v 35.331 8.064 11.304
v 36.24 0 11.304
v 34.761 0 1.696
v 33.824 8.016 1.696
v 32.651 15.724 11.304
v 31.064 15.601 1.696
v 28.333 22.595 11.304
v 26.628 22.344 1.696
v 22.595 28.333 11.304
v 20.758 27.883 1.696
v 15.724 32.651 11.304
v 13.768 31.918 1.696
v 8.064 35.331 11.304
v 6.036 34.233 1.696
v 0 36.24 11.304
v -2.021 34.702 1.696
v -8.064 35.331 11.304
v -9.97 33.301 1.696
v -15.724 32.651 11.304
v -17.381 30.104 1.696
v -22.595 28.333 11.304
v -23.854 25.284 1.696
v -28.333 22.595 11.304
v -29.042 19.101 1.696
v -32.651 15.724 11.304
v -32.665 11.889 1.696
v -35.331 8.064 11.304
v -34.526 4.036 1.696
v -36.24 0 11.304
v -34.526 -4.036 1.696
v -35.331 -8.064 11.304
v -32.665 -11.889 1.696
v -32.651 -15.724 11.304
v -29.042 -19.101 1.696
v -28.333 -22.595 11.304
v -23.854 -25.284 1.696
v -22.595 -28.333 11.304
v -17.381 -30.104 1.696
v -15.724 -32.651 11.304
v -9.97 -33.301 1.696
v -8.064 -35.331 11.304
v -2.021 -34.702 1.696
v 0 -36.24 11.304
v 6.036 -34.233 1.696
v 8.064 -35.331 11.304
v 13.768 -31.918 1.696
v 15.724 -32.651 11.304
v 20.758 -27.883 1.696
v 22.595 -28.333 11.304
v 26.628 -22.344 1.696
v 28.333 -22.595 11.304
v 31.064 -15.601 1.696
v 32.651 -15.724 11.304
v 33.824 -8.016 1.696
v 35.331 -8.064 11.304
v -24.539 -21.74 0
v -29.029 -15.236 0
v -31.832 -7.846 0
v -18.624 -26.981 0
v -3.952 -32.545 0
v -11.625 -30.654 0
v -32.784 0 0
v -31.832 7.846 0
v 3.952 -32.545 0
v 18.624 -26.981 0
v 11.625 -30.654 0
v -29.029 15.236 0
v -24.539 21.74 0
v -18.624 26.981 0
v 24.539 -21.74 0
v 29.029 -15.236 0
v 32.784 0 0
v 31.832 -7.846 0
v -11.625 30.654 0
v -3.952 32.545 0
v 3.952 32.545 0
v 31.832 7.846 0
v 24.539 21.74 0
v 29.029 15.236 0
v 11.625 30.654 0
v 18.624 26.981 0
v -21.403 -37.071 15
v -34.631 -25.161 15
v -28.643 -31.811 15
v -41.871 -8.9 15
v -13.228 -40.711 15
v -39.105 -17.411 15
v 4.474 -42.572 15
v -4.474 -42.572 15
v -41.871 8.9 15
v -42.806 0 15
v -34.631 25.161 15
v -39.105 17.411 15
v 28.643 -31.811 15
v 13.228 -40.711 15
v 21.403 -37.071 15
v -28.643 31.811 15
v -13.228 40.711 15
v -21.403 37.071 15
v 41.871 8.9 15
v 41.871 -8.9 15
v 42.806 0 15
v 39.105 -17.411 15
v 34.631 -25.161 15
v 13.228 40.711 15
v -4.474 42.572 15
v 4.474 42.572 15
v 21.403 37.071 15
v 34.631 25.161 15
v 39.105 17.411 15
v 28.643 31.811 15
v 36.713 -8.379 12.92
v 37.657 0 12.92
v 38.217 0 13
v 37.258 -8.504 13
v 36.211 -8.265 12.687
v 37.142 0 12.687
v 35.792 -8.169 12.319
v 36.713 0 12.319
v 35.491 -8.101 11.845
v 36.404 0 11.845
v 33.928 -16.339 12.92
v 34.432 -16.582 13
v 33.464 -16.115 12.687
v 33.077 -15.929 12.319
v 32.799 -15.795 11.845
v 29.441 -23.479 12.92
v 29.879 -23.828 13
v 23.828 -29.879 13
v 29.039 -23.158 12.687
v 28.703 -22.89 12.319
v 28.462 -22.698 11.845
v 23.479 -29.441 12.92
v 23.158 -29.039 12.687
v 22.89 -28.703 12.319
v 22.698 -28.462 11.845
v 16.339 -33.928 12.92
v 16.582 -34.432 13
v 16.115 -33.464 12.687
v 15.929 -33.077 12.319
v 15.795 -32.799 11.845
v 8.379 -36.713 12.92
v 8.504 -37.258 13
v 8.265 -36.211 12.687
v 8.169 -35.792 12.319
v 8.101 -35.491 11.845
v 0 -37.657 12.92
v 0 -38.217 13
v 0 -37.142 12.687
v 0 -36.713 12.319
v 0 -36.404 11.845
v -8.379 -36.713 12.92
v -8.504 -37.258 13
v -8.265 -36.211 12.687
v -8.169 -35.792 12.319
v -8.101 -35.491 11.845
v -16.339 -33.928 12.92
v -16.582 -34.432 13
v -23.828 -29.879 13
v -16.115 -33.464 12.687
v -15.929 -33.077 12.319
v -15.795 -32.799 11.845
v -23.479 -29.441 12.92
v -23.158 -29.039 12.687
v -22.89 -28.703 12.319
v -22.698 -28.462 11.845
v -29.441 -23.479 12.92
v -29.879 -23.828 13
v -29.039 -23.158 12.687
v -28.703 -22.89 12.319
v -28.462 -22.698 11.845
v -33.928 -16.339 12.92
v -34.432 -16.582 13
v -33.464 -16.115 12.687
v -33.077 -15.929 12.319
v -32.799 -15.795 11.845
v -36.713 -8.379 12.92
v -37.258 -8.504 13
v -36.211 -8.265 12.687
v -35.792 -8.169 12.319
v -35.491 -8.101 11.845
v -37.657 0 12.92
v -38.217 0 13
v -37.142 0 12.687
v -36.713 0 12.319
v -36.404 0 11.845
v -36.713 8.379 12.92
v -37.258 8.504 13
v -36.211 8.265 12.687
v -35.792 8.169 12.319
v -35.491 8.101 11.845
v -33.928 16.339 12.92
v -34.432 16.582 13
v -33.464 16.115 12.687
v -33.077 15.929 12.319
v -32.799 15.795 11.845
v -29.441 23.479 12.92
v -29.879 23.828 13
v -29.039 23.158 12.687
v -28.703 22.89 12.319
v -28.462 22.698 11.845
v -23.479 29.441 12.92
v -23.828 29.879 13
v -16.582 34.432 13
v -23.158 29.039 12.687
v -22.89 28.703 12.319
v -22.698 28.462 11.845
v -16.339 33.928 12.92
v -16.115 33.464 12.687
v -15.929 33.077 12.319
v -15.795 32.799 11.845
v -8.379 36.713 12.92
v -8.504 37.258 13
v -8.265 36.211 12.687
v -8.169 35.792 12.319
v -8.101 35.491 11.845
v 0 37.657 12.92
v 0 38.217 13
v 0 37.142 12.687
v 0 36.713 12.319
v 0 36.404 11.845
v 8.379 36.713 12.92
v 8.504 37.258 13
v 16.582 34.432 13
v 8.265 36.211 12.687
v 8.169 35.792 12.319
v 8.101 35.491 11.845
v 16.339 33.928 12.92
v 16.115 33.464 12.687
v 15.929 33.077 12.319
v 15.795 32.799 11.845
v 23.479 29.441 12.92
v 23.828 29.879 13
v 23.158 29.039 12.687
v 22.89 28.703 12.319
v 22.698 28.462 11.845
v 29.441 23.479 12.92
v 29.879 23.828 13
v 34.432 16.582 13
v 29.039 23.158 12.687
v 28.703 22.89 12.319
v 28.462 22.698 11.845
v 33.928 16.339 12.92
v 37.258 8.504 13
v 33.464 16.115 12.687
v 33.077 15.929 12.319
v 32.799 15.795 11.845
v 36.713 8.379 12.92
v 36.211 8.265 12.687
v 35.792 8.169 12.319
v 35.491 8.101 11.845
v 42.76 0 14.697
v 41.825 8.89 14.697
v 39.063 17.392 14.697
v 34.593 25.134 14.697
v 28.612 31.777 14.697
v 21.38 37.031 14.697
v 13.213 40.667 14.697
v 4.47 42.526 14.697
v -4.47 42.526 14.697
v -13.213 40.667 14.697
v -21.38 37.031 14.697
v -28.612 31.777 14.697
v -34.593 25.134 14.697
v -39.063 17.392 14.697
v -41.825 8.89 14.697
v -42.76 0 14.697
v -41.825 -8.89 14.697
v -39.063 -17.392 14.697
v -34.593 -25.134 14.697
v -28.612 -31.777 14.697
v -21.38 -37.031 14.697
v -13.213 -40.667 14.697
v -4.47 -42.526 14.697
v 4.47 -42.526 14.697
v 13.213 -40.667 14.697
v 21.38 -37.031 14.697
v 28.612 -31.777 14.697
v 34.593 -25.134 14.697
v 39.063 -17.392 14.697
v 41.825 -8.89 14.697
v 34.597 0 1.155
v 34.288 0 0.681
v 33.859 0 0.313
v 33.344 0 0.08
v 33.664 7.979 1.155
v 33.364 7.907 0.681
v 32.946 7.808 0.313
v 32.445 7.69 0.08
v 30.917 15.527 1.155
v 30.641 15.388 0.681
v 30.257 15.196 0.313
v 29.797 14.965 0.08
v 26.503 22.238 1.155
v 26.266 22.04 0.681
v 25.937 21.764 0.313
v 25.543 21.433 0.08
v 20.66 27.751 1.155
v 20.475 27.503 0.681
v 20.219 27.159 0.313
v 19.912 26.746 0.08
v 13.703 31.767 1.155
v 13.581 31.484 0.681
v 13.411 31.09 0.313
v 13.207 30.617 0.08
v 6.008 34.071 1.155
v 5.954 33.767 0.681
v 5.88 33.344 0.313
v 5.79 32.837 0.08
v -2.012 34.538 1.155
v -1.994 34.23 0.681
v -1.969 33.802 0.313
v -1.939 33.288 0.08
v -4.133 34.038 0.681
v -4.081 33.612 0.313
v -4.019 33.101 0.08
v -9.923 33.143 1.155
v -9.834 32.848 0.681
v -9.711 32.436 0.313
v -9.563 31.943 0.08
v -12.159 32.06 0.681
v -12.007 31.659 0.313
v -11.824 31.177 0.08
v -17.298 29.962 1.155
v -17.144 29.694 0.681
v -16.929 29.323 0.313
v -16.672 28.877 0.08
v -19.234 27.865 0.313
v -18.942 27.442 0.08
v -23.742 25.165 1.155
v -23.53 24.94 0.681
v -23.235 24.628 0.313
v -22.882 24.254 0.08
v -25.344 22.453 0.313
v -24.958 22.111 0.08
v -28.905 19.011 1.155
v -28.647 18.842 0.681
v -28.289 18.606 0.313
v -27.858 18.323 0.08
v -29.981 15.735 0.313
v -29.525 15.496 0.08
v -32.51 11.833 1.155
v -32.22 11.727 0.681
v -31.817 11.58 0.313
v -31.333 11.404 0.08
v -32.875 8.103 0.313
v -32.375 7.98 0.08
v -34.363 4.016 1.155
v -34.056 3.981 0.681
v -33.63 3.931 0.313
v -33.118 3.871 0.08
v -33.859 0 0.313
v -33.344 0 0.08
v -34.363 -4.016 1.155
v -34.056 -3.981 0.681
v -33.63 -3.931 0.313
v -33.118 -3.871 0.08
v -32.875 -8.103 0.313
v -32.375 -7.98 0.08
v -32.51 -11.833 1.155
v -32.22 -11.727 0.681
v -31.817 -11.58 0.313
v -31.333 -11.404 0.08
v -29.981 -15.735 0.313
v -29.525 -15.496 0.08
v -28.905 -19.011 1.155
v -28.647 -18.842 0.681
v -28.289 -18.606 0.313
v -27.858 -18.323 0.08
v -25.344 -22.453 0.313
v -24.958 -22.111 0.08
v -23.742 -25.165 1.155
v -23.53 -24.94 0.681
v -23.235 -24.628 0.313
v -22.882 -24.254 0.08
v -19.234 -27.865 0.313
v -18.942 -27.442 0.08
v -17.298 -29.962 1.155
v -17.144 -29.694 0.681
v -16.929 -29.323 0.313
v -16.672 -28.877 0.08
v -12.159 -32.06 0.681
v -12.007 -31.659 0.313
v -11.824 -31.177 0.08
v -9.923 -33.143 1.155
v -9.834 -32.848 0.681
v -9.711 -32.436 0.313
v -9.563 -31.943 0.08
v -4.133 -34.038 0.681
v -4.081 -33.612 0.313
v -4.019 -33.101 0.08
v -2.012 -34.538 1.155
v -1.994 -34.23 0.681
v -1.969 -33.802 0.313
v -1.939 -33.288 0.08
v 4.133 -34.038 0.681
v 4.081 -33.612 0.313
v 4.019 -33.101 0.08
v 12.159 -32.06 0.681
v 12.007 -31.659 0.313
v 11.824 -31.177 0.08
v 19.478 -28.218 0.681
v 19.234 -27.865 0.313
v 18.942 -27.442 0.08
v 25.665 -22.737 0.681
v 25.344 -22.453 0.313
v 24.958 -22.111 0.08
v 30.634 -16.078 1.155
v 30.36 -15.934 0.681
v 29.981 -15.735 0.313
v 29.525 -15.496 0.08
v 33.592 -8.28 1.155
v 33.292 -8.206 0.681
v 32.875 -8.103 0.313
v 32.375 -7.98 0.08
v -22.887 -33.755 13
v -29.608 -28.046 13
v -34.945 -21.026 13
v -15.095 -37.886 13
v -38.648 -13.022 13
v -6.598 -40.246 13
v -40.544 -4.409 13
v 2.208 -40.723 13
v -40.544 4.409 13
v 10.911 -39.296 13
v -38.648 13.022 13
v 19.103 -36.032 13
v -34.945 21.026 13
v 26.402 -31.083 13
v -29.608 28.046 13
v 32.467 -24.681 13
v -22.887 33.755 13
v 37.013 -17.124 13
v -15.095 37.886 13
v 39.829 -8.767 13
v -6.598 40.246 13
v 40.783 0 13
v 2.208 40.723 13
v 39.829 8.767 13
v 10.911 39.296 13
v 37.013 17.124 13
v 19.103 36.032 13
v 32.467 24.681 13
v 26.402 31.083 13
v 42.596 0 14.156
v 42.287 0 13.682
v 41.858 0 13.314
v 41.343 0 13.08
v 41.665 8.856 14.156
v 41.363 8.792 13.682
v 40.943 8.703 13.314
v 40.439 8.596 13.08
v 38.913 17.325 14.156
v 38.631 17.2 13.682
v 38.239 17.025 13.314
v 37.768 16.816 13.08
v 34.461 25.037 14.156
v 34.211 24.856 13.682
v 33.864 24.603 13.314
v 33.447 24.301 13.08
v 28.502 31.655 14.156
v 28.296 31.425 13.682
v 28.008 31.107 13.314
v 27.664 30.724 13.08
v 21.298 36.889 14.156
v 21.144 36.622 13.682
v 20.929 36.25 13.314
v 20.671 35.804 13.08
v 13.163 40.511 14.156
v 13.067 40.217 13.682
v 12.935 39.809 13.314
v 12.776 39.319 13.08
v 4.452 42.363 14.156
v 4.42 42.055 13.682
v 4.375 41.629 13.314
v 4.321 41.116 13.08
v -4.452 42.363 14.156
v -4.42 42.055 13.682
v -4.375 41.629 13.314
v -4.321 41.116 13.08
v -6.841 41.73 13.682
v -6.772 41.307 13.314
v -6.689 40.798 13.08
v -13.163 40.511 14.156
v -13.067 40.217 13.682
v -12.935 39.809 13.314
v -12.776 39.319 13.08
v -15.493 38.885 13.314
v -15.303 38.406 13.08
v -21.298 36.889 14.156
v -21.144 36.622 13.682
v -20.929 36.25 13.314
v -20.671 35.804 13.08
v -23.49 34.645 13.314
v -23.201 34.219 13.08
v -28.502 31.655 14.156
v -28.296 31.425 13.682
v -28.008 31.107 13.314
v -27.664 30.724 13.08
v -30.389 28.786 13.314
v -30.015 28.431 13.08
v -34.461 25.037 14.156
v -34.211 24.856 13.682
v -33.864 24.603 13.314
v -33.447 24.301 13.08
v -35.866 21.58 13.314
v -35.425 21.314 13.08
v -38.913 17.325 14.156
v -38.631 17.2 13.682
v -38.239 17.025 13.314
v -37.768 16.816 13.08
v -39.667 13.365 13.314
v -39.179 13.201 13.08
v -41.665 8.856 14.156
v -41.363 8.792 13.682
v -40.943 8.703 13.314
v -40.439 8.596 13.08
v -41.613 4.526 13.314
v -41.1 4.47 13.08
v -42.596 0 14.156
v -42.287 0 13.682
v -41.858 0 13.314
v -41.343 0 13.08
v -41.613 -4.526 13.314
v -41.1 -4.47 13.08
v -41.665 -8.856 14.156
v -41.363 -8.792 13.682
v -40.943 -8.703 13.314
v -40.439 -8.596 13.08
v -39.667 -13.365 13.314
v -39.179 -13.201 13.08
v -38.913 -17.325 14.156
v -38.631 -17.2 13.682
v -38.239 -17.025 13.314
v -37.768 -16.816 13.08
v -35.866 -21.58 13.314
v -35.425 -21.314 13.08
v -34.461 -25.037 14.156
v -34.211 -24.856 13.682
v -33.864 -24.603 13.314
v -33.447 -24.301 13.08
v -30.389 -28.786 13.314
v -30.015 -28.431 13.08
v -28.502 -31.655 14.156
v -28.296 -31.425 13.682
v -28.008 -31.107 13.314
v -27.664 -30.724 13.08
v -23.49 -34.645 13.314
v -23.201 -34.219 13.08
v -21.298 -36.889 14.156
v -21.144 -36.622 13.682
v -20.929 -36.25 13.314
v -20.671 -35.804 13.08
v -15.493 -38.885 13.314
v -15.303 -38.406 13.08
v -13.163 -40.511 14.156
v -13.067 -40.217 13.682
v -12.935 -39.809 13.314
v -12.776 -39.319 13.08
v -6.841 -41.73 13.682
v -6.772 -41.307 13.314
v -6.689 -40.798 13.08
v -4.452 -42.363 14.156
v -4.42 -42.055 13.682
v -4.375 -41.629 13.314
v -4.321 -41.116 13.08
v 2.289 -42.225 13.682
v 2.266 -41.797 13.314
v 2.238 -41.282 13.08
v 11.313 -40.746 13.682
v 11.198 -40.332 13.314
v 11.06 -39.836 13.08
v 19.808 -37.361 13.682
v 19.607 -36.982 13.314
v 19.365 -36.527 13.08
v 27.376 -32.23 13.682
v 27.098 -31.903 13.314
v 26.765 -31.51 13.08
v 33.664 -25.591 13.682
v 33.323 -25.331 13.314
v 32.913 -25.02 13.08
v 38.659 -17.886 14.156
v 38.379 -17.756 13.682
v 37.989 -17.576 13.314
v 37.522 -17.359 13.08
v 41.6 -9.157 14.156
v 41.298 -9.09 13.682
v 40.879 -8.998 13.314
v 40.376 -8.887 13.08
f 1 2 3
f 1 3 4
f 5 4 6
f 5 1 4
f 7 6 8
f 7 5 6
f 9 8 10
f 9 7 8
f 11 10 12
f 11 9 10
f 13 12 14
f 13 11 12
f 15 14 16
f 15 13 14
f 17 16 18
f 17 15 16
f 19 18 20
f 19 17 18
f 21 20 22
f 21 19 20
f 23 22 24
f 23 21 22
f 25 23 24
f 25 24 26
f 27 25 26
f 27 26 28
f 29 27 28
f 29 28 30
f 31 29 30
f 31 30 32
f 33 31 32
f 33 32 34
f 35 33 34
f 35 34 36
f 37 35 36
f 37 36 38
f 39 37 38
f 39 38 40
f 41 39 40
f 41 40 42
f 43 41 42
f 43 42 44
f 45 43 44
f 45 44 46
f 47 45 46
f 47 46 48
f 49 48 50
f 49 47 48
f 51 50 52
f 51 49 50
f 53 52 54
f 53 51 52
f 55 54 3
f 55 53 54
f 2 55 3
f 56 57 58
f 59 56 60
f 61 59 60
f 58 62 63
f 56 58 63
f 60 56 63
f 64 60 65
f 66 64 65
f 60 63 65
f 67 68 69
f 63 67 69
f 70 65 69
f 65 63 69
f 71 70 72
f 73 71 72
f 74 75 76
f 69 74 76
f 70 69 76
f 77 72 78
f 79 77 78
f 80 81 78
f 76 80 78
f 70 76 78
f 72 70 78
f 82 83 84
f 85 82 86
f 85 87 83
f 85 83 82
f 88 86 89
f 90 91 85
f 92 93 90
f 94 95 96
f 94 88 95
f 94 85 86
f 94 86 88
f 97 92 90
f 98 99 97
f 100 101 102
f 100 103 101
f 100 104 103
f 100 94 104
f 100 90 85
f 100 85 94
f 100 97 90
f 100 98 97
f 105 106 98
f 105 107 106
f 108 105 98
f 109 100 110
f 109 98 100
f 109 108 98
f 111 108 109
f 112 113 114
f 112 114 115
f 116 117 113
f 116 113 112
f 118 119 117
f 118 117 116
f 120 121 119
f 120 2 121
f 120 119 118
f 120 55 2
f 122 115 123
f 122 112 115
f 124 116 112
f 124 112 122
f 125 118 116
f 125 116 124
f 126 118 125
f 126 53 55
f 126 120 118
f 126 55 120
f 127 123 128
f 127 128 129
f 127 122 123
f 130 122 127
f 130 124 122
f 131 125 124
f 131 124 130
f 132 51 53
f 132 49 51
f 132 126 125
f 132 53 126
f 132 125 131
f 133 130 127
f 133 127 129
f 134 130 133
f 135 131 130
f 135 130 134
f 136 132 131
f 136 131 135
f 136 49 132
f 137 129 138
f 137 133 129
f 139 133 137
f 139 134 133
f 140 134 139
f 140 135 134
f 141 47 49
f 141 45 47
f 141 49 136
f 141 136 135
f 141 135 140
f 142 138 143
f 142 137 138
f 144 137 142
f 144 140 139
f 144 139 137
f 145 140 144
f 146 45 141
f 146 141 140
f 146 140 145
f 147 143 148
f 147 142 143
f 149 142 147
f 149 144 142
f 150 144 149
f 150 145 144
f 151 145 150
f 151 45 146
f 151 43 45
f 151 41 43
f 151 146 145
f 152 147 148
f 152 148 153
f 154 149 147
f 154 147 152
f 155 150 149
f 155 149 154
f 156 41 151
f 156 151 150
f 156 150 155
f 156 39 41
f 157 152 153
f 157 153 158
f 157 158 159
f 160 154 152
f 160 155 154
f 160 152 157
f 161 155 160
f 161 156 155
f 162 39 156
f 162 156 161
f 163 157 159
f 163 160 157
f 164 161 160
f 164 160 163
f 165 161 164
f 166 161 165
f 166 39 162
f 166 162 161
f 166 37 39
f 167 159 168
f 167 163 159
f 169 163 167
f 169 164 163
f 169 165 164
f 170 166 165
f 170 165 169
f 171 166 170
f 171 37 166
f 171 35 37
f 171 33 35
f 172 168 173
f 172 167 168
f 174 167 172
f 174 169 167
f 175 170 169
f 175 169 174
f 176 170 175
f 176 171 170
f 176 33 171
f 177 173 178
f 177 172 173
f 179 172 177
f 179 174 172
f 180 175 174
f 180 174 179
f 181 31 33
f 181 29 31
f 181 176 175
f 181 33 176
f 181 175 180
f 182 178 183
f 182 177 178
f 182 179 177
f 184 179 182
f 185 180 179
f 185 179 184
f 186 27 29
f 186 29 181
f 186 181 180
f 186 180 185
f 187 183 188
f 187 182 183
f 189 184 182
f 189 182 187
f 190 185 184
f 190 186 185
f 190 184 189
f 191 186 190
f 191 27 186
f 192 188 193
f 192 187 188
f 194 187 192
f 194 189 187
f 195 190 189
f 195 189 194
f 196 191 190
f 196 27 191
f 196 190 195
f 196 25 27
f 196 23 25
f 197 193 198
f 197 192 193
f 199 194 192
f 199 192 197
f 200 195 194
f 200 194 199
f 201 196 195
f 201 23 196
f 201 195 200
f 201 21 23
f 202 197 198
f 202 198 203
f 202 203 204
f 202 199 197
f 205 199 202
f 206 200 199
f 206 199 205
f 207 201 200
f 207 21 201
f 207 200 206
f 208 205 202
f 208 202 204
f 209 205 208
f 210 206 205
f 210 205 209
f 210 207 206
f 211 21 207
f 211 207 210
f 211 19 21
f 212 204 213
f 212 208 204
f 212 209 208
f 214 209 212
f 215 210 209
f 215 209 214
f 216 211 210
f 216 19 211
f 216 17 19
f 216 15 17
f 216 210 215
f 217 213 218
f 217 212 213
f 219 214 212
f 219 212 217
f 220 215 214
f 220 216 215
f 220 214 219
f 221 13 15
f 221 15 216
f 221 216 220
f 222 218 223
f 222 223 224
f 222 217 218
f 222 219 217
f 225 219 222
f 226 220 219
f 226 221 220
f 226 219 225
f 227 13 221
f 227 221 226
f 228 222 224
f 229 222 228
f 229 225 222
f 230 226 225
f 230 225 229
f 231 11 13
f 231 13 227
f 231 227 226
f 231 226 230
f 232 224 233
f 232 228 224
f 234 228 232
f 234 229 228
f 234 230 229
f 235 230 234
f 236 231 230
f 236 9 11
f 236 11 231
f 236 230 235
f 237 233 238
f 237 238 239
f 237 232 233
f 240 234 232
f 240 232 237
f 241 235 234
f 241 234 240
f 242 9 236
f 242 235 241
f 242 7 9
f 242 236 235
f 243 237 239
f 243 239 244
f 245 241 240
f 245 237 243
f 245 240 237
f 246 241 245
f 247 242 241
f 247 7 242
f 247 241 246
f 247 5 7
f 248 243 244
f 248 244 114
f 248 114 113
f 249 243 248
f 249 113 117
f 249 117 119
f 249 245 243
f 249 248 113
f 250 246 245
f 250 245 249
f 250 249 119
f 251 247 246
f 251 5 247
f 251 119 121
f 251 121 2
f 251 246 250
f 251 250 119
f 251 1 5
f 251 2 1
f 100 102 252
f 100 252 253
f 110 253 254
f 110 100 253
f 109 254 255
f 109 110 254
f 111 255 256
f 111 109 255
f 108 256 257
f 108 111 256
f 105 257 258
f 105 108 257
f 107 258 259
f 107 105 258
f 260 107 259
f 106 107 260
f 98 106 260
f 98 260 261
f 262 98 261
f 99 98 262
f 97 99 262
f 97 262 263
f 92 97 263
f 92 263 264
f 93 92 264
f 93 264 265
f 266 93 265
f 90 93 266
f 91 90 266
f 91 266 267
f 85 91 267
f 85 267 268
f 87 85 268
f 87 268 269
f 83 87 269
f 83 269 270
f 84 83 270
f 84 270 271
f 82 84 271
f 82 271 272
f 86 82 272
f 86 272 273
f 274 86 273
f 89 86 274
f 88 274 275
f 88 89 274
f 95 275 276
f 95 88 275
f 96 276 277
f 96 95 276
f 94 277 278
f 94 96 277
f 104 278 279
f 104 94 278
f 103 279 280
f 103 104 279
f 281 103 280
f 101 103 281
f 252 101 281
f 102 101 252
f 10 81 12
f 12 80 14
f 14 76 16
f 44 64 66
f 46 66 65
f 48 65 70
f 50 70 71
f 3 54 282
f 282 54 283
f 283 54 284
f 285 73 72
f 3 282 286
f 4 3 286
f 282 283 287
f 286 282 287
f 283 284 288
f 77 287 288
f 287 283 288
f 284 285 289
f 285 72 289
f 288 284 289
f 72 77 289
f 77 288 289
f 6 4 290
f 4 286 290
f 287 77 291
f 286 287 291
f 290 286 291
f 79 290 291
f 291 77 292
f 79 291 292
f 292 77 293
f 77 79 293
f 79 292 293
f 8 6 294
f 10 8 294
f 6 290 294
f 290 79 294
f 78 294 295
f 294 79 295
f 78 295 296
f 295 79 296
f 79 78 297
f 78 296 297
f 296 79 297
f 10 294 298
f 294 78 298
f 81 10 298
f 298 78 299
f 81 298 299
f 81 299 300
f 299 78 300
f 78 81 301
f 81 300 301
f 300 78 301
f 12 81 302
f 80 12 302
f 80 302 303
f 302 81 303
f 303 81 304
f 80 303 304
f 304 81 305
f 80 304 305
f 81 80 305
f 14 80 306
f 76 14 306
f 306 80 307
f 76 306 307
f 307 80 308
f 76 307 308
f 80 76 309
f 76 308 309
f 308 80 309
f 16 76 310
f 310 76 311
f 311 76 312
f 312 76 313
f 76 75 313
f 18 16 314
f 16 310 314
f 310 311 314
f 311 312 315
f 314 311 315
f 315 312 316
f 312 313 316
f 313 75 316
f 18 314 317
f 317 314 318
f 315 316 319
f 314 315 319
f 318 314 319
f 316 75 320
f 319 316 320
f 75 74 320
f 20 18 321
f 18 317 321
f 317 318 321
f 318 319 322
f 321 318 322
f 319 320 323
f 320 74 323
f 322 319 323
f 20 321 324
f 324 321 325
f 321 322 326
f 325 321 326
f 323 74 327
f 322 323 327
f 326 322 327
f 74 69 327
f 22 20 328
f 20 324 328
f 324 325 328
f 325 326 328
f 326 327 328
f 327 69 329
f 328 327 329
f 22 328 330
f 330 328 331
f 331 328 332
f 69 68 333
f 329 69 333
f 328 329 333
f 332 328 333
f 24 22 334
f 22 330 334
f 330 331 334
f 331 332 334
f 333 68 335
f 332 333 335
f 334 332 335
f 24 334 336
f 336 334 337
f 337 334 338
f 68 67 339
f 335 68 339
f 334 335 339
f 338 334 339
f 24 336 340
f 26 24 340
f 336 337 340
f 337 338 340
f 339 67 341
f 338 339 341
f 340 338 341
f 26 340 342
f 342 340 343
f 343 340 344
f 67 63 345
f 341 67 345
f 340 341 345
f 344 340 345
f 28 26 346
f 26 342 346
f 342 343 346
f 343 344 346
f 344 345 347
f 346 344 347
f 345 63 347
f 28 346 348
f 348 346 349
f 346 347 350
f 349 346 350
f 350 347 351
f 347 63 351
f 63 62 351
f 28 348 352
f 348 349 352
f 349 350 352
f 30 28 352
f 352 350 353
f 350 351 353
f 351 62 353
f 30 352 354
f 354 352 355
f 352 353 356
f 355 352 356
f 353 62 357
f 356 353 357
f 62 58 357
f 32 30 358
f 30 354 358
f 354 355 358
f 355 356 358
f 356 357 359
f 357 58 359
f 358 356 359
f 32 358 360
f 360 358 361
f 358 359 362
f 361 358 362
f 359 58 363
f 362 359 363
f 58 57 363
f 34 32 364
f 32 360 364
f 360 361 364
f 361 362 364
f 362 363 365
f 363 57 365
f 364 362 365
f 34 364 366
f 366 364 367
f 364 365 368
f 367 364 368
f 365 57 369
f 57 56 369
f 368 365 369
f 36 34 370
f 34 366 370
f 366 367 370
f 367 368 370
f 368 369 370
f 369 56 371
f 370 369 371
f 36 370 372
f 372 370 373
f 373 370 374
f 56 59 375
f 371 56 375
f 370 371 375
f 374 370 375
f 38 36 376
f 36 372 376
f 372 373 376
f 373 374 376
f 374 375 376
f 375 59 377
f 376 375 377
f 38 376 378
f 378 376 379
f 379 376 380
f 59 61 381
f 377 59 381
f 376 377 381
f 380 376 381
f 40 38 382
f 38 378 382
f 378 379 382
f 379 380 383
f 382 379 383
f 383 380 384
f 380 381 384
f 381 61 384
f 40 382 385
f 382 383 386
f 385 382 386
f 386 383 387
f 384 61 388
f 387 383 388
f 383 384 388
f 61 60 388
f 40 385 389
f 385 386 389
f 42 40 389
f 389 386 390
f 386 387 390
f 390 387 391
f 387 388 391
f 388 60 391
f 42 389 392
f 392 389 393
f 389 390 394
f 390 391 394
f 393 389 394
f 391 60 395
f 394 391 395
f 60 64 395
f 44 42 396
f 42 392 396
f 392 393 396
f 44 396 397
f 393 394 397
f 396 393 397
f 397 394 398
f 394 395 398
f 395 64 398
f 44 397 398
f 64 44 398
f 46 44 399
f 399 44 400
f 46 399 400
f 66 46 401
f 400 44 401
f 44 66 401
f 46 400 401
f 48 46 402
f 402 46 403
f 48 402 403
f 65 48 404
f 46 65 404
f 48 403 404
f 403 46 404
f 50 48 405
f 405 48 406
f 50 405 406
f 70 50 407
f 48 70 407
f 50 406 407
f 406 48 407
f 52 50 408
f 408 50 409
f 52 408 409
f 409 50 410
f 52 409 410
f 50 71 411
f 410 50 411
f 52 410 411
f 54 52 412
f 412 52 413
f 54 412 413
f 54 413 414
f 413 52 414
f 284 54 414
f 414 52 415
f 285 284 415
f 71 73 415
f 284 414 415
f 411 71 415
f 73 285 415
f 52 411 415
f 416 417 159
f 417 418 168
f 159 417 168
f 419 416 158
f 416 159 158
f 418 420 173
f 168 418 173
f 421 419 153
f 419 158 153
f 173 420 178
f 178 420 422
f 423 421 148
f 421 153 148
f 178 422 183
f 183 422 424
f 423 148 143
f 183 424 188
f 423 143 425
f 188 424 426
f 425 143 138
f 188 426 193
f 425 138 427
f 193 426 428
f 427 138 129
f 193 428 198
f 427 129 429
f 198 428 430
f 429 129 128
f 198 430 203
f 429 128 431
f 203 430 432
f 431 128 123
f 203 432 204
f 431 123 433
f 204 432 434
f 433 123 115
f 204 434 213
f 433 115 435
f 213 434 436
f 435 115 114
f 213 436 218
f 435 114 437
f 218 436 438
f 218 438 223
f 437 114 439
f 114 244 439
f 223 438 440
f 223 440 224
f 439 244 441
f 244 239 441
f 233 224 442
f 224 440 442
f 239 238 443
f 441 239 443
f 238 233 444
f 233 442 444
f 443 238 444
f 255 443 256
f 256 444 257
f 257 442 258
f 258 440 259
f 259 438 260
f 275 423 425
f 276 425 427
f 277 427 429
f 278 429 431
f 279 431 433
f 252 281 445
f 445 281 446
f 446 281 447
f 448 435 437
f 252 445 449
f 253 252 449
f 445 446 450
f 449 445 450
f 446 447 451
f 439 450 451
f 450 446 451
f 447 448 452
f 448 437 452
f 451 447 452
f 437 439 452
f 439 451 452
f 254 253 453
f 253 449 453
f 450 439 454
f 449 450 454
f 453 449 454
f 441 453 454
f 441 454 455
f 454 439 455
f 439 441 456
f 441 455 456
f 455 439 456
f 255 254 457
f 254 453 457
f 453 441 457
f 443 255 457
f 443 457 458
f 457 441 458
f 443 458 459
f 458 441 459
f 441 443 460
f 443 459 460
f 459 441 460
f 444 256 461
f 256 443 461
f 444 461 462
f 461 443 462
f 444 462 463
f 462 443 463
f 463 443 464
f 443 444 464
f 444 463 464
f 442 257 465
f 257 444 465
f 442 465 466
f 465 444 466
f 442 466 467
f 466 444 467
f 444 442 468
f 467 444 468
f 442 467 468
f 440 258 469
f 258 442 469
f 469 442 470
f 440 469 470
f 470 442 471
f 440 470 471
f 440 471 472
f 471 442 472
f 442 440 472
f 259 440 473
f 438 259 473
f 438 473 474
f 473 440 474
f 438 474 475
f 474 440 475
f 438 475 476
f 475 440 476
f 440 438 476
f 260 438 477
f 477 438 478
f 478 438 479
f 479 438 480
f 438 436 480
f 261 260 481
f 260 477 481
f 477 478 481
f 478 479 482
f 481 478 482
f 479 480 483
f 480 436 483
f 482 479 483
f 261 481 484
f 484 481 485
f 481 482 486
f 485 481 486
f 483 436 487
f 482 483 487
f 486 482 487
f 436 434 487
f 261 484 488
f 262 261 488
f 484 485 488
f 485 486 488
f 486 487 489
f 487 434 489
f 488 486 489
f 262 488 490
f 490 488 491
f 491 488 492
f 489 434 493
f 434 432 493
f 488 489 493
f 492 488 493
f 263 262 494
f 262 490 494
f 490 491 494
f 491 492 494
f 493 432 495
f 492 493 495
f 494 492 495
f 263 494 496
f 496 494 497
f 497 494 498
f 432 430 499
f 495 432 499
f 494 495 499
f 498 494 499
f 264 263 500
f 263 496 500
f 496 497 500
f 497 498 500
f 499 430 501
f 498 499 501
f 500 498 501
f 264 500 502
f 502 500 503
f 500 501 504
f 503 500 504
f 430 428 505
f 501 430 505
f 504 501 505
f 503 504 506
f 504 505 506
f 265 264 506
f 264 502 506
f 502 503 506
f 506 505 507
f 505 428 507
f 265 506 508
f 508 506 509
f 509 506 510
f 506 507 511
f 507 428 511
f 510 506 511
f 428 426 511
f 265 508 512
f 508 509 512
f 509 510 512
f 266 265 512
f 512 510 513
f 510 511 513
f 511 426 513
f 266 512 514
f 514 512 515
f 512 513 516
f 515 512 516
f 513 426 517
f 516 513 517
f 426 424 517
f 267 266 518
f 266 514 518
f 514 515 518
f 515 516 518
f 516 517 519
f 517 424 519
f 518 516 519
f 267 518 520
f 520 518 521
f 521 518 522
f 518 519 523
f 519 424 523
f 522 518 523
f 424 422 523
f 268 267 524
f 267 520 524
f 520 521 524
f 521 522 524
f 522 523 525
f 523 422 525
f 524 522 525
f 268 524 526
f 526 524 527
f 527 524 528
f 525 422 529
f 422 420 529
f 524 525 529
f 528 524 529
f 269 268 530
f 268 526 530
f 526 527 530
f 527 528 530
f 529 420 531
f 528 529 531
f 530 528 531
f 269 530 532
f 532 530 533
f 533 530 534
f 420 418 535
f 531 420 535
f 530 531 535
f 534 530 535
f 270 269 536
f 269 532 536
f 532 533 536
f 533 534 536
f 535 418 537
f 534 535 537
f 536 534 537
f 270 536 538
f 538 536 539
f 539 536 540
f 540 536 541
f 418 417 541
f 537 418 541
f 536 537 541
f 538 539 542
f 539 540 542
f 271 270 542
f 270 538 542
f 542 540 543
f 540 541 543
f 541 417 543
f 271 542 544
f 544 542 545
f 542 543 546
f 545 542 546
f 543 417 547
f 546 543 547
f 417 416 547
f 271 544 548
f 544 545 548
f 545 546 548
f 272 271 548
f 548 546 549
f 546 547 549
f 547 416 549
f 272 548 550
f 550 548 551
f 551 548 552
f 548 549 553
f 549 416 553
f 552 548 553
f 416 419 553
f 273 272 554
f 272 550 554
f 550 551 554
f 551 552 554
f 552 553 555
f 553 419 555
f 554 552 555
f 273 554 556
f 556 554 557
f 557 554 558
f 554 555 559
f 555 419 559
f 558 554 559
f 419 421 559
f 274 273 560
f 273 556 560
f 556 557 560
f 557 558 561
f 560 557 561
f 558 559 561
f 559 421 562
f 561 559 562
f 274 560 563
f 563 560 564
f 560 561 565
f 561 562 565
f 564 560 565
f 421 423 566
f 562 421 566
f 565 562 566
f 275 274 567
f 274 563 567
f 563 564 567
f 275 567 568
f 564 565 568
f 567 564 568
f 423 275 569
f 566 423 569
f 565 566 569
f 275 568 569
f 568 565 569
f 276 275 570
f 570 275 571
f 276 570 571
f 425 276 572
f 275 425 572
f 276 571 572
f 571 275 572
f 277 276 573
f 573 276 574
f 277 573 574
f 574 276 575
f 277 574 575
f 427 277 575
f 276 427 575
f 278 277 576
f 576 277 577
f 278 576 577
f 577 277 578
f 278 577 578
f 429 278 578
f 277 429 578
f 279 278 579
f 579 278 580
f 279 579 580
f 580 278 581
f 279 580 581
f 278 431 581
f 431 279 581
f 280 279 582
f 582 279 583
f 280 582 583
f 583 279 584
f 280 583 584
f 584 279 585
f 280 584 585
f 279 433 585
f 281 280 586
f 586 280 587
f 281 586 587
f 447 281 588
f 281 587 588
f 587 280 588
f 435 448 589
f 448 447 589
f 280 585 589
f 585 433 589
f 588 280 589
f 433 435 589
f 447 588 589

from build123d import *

# Parameters (mm, degrees)
F0_R     = 34.5
F1_DEPTH = 13
F1_TAPER = -8.75
F2_R     = 42.5
F3_DEPTH = 2
F3_TAPER = -8.7
F4_R     = 2


with BuildPart() as f1:
    # F0 (on Top) → F1 (new body)
    with BuildSketch(Plane.XY):
        Circle(F0_R)
    extrude(amount=F1_DEPTH, taper=F1_TAPER)

    # F2 (on face) → F3 (join)
    with BuildSketch(Plane.XY.offset(13)):
        Circle(F2_R)
    extrude(amount=F3_DEPTH, taper=F3_TAPER)

    # F4
    f4_edges = [f1.edges().sort_by_distance(p)[0] for p in [
        (-34.5, 0, 0),
        (-36.500891, 0, 13),
        (-42.5, 0, 13),
    ]]
    fillet(f4_edges, radius=F4_R)


solid = f1.part
